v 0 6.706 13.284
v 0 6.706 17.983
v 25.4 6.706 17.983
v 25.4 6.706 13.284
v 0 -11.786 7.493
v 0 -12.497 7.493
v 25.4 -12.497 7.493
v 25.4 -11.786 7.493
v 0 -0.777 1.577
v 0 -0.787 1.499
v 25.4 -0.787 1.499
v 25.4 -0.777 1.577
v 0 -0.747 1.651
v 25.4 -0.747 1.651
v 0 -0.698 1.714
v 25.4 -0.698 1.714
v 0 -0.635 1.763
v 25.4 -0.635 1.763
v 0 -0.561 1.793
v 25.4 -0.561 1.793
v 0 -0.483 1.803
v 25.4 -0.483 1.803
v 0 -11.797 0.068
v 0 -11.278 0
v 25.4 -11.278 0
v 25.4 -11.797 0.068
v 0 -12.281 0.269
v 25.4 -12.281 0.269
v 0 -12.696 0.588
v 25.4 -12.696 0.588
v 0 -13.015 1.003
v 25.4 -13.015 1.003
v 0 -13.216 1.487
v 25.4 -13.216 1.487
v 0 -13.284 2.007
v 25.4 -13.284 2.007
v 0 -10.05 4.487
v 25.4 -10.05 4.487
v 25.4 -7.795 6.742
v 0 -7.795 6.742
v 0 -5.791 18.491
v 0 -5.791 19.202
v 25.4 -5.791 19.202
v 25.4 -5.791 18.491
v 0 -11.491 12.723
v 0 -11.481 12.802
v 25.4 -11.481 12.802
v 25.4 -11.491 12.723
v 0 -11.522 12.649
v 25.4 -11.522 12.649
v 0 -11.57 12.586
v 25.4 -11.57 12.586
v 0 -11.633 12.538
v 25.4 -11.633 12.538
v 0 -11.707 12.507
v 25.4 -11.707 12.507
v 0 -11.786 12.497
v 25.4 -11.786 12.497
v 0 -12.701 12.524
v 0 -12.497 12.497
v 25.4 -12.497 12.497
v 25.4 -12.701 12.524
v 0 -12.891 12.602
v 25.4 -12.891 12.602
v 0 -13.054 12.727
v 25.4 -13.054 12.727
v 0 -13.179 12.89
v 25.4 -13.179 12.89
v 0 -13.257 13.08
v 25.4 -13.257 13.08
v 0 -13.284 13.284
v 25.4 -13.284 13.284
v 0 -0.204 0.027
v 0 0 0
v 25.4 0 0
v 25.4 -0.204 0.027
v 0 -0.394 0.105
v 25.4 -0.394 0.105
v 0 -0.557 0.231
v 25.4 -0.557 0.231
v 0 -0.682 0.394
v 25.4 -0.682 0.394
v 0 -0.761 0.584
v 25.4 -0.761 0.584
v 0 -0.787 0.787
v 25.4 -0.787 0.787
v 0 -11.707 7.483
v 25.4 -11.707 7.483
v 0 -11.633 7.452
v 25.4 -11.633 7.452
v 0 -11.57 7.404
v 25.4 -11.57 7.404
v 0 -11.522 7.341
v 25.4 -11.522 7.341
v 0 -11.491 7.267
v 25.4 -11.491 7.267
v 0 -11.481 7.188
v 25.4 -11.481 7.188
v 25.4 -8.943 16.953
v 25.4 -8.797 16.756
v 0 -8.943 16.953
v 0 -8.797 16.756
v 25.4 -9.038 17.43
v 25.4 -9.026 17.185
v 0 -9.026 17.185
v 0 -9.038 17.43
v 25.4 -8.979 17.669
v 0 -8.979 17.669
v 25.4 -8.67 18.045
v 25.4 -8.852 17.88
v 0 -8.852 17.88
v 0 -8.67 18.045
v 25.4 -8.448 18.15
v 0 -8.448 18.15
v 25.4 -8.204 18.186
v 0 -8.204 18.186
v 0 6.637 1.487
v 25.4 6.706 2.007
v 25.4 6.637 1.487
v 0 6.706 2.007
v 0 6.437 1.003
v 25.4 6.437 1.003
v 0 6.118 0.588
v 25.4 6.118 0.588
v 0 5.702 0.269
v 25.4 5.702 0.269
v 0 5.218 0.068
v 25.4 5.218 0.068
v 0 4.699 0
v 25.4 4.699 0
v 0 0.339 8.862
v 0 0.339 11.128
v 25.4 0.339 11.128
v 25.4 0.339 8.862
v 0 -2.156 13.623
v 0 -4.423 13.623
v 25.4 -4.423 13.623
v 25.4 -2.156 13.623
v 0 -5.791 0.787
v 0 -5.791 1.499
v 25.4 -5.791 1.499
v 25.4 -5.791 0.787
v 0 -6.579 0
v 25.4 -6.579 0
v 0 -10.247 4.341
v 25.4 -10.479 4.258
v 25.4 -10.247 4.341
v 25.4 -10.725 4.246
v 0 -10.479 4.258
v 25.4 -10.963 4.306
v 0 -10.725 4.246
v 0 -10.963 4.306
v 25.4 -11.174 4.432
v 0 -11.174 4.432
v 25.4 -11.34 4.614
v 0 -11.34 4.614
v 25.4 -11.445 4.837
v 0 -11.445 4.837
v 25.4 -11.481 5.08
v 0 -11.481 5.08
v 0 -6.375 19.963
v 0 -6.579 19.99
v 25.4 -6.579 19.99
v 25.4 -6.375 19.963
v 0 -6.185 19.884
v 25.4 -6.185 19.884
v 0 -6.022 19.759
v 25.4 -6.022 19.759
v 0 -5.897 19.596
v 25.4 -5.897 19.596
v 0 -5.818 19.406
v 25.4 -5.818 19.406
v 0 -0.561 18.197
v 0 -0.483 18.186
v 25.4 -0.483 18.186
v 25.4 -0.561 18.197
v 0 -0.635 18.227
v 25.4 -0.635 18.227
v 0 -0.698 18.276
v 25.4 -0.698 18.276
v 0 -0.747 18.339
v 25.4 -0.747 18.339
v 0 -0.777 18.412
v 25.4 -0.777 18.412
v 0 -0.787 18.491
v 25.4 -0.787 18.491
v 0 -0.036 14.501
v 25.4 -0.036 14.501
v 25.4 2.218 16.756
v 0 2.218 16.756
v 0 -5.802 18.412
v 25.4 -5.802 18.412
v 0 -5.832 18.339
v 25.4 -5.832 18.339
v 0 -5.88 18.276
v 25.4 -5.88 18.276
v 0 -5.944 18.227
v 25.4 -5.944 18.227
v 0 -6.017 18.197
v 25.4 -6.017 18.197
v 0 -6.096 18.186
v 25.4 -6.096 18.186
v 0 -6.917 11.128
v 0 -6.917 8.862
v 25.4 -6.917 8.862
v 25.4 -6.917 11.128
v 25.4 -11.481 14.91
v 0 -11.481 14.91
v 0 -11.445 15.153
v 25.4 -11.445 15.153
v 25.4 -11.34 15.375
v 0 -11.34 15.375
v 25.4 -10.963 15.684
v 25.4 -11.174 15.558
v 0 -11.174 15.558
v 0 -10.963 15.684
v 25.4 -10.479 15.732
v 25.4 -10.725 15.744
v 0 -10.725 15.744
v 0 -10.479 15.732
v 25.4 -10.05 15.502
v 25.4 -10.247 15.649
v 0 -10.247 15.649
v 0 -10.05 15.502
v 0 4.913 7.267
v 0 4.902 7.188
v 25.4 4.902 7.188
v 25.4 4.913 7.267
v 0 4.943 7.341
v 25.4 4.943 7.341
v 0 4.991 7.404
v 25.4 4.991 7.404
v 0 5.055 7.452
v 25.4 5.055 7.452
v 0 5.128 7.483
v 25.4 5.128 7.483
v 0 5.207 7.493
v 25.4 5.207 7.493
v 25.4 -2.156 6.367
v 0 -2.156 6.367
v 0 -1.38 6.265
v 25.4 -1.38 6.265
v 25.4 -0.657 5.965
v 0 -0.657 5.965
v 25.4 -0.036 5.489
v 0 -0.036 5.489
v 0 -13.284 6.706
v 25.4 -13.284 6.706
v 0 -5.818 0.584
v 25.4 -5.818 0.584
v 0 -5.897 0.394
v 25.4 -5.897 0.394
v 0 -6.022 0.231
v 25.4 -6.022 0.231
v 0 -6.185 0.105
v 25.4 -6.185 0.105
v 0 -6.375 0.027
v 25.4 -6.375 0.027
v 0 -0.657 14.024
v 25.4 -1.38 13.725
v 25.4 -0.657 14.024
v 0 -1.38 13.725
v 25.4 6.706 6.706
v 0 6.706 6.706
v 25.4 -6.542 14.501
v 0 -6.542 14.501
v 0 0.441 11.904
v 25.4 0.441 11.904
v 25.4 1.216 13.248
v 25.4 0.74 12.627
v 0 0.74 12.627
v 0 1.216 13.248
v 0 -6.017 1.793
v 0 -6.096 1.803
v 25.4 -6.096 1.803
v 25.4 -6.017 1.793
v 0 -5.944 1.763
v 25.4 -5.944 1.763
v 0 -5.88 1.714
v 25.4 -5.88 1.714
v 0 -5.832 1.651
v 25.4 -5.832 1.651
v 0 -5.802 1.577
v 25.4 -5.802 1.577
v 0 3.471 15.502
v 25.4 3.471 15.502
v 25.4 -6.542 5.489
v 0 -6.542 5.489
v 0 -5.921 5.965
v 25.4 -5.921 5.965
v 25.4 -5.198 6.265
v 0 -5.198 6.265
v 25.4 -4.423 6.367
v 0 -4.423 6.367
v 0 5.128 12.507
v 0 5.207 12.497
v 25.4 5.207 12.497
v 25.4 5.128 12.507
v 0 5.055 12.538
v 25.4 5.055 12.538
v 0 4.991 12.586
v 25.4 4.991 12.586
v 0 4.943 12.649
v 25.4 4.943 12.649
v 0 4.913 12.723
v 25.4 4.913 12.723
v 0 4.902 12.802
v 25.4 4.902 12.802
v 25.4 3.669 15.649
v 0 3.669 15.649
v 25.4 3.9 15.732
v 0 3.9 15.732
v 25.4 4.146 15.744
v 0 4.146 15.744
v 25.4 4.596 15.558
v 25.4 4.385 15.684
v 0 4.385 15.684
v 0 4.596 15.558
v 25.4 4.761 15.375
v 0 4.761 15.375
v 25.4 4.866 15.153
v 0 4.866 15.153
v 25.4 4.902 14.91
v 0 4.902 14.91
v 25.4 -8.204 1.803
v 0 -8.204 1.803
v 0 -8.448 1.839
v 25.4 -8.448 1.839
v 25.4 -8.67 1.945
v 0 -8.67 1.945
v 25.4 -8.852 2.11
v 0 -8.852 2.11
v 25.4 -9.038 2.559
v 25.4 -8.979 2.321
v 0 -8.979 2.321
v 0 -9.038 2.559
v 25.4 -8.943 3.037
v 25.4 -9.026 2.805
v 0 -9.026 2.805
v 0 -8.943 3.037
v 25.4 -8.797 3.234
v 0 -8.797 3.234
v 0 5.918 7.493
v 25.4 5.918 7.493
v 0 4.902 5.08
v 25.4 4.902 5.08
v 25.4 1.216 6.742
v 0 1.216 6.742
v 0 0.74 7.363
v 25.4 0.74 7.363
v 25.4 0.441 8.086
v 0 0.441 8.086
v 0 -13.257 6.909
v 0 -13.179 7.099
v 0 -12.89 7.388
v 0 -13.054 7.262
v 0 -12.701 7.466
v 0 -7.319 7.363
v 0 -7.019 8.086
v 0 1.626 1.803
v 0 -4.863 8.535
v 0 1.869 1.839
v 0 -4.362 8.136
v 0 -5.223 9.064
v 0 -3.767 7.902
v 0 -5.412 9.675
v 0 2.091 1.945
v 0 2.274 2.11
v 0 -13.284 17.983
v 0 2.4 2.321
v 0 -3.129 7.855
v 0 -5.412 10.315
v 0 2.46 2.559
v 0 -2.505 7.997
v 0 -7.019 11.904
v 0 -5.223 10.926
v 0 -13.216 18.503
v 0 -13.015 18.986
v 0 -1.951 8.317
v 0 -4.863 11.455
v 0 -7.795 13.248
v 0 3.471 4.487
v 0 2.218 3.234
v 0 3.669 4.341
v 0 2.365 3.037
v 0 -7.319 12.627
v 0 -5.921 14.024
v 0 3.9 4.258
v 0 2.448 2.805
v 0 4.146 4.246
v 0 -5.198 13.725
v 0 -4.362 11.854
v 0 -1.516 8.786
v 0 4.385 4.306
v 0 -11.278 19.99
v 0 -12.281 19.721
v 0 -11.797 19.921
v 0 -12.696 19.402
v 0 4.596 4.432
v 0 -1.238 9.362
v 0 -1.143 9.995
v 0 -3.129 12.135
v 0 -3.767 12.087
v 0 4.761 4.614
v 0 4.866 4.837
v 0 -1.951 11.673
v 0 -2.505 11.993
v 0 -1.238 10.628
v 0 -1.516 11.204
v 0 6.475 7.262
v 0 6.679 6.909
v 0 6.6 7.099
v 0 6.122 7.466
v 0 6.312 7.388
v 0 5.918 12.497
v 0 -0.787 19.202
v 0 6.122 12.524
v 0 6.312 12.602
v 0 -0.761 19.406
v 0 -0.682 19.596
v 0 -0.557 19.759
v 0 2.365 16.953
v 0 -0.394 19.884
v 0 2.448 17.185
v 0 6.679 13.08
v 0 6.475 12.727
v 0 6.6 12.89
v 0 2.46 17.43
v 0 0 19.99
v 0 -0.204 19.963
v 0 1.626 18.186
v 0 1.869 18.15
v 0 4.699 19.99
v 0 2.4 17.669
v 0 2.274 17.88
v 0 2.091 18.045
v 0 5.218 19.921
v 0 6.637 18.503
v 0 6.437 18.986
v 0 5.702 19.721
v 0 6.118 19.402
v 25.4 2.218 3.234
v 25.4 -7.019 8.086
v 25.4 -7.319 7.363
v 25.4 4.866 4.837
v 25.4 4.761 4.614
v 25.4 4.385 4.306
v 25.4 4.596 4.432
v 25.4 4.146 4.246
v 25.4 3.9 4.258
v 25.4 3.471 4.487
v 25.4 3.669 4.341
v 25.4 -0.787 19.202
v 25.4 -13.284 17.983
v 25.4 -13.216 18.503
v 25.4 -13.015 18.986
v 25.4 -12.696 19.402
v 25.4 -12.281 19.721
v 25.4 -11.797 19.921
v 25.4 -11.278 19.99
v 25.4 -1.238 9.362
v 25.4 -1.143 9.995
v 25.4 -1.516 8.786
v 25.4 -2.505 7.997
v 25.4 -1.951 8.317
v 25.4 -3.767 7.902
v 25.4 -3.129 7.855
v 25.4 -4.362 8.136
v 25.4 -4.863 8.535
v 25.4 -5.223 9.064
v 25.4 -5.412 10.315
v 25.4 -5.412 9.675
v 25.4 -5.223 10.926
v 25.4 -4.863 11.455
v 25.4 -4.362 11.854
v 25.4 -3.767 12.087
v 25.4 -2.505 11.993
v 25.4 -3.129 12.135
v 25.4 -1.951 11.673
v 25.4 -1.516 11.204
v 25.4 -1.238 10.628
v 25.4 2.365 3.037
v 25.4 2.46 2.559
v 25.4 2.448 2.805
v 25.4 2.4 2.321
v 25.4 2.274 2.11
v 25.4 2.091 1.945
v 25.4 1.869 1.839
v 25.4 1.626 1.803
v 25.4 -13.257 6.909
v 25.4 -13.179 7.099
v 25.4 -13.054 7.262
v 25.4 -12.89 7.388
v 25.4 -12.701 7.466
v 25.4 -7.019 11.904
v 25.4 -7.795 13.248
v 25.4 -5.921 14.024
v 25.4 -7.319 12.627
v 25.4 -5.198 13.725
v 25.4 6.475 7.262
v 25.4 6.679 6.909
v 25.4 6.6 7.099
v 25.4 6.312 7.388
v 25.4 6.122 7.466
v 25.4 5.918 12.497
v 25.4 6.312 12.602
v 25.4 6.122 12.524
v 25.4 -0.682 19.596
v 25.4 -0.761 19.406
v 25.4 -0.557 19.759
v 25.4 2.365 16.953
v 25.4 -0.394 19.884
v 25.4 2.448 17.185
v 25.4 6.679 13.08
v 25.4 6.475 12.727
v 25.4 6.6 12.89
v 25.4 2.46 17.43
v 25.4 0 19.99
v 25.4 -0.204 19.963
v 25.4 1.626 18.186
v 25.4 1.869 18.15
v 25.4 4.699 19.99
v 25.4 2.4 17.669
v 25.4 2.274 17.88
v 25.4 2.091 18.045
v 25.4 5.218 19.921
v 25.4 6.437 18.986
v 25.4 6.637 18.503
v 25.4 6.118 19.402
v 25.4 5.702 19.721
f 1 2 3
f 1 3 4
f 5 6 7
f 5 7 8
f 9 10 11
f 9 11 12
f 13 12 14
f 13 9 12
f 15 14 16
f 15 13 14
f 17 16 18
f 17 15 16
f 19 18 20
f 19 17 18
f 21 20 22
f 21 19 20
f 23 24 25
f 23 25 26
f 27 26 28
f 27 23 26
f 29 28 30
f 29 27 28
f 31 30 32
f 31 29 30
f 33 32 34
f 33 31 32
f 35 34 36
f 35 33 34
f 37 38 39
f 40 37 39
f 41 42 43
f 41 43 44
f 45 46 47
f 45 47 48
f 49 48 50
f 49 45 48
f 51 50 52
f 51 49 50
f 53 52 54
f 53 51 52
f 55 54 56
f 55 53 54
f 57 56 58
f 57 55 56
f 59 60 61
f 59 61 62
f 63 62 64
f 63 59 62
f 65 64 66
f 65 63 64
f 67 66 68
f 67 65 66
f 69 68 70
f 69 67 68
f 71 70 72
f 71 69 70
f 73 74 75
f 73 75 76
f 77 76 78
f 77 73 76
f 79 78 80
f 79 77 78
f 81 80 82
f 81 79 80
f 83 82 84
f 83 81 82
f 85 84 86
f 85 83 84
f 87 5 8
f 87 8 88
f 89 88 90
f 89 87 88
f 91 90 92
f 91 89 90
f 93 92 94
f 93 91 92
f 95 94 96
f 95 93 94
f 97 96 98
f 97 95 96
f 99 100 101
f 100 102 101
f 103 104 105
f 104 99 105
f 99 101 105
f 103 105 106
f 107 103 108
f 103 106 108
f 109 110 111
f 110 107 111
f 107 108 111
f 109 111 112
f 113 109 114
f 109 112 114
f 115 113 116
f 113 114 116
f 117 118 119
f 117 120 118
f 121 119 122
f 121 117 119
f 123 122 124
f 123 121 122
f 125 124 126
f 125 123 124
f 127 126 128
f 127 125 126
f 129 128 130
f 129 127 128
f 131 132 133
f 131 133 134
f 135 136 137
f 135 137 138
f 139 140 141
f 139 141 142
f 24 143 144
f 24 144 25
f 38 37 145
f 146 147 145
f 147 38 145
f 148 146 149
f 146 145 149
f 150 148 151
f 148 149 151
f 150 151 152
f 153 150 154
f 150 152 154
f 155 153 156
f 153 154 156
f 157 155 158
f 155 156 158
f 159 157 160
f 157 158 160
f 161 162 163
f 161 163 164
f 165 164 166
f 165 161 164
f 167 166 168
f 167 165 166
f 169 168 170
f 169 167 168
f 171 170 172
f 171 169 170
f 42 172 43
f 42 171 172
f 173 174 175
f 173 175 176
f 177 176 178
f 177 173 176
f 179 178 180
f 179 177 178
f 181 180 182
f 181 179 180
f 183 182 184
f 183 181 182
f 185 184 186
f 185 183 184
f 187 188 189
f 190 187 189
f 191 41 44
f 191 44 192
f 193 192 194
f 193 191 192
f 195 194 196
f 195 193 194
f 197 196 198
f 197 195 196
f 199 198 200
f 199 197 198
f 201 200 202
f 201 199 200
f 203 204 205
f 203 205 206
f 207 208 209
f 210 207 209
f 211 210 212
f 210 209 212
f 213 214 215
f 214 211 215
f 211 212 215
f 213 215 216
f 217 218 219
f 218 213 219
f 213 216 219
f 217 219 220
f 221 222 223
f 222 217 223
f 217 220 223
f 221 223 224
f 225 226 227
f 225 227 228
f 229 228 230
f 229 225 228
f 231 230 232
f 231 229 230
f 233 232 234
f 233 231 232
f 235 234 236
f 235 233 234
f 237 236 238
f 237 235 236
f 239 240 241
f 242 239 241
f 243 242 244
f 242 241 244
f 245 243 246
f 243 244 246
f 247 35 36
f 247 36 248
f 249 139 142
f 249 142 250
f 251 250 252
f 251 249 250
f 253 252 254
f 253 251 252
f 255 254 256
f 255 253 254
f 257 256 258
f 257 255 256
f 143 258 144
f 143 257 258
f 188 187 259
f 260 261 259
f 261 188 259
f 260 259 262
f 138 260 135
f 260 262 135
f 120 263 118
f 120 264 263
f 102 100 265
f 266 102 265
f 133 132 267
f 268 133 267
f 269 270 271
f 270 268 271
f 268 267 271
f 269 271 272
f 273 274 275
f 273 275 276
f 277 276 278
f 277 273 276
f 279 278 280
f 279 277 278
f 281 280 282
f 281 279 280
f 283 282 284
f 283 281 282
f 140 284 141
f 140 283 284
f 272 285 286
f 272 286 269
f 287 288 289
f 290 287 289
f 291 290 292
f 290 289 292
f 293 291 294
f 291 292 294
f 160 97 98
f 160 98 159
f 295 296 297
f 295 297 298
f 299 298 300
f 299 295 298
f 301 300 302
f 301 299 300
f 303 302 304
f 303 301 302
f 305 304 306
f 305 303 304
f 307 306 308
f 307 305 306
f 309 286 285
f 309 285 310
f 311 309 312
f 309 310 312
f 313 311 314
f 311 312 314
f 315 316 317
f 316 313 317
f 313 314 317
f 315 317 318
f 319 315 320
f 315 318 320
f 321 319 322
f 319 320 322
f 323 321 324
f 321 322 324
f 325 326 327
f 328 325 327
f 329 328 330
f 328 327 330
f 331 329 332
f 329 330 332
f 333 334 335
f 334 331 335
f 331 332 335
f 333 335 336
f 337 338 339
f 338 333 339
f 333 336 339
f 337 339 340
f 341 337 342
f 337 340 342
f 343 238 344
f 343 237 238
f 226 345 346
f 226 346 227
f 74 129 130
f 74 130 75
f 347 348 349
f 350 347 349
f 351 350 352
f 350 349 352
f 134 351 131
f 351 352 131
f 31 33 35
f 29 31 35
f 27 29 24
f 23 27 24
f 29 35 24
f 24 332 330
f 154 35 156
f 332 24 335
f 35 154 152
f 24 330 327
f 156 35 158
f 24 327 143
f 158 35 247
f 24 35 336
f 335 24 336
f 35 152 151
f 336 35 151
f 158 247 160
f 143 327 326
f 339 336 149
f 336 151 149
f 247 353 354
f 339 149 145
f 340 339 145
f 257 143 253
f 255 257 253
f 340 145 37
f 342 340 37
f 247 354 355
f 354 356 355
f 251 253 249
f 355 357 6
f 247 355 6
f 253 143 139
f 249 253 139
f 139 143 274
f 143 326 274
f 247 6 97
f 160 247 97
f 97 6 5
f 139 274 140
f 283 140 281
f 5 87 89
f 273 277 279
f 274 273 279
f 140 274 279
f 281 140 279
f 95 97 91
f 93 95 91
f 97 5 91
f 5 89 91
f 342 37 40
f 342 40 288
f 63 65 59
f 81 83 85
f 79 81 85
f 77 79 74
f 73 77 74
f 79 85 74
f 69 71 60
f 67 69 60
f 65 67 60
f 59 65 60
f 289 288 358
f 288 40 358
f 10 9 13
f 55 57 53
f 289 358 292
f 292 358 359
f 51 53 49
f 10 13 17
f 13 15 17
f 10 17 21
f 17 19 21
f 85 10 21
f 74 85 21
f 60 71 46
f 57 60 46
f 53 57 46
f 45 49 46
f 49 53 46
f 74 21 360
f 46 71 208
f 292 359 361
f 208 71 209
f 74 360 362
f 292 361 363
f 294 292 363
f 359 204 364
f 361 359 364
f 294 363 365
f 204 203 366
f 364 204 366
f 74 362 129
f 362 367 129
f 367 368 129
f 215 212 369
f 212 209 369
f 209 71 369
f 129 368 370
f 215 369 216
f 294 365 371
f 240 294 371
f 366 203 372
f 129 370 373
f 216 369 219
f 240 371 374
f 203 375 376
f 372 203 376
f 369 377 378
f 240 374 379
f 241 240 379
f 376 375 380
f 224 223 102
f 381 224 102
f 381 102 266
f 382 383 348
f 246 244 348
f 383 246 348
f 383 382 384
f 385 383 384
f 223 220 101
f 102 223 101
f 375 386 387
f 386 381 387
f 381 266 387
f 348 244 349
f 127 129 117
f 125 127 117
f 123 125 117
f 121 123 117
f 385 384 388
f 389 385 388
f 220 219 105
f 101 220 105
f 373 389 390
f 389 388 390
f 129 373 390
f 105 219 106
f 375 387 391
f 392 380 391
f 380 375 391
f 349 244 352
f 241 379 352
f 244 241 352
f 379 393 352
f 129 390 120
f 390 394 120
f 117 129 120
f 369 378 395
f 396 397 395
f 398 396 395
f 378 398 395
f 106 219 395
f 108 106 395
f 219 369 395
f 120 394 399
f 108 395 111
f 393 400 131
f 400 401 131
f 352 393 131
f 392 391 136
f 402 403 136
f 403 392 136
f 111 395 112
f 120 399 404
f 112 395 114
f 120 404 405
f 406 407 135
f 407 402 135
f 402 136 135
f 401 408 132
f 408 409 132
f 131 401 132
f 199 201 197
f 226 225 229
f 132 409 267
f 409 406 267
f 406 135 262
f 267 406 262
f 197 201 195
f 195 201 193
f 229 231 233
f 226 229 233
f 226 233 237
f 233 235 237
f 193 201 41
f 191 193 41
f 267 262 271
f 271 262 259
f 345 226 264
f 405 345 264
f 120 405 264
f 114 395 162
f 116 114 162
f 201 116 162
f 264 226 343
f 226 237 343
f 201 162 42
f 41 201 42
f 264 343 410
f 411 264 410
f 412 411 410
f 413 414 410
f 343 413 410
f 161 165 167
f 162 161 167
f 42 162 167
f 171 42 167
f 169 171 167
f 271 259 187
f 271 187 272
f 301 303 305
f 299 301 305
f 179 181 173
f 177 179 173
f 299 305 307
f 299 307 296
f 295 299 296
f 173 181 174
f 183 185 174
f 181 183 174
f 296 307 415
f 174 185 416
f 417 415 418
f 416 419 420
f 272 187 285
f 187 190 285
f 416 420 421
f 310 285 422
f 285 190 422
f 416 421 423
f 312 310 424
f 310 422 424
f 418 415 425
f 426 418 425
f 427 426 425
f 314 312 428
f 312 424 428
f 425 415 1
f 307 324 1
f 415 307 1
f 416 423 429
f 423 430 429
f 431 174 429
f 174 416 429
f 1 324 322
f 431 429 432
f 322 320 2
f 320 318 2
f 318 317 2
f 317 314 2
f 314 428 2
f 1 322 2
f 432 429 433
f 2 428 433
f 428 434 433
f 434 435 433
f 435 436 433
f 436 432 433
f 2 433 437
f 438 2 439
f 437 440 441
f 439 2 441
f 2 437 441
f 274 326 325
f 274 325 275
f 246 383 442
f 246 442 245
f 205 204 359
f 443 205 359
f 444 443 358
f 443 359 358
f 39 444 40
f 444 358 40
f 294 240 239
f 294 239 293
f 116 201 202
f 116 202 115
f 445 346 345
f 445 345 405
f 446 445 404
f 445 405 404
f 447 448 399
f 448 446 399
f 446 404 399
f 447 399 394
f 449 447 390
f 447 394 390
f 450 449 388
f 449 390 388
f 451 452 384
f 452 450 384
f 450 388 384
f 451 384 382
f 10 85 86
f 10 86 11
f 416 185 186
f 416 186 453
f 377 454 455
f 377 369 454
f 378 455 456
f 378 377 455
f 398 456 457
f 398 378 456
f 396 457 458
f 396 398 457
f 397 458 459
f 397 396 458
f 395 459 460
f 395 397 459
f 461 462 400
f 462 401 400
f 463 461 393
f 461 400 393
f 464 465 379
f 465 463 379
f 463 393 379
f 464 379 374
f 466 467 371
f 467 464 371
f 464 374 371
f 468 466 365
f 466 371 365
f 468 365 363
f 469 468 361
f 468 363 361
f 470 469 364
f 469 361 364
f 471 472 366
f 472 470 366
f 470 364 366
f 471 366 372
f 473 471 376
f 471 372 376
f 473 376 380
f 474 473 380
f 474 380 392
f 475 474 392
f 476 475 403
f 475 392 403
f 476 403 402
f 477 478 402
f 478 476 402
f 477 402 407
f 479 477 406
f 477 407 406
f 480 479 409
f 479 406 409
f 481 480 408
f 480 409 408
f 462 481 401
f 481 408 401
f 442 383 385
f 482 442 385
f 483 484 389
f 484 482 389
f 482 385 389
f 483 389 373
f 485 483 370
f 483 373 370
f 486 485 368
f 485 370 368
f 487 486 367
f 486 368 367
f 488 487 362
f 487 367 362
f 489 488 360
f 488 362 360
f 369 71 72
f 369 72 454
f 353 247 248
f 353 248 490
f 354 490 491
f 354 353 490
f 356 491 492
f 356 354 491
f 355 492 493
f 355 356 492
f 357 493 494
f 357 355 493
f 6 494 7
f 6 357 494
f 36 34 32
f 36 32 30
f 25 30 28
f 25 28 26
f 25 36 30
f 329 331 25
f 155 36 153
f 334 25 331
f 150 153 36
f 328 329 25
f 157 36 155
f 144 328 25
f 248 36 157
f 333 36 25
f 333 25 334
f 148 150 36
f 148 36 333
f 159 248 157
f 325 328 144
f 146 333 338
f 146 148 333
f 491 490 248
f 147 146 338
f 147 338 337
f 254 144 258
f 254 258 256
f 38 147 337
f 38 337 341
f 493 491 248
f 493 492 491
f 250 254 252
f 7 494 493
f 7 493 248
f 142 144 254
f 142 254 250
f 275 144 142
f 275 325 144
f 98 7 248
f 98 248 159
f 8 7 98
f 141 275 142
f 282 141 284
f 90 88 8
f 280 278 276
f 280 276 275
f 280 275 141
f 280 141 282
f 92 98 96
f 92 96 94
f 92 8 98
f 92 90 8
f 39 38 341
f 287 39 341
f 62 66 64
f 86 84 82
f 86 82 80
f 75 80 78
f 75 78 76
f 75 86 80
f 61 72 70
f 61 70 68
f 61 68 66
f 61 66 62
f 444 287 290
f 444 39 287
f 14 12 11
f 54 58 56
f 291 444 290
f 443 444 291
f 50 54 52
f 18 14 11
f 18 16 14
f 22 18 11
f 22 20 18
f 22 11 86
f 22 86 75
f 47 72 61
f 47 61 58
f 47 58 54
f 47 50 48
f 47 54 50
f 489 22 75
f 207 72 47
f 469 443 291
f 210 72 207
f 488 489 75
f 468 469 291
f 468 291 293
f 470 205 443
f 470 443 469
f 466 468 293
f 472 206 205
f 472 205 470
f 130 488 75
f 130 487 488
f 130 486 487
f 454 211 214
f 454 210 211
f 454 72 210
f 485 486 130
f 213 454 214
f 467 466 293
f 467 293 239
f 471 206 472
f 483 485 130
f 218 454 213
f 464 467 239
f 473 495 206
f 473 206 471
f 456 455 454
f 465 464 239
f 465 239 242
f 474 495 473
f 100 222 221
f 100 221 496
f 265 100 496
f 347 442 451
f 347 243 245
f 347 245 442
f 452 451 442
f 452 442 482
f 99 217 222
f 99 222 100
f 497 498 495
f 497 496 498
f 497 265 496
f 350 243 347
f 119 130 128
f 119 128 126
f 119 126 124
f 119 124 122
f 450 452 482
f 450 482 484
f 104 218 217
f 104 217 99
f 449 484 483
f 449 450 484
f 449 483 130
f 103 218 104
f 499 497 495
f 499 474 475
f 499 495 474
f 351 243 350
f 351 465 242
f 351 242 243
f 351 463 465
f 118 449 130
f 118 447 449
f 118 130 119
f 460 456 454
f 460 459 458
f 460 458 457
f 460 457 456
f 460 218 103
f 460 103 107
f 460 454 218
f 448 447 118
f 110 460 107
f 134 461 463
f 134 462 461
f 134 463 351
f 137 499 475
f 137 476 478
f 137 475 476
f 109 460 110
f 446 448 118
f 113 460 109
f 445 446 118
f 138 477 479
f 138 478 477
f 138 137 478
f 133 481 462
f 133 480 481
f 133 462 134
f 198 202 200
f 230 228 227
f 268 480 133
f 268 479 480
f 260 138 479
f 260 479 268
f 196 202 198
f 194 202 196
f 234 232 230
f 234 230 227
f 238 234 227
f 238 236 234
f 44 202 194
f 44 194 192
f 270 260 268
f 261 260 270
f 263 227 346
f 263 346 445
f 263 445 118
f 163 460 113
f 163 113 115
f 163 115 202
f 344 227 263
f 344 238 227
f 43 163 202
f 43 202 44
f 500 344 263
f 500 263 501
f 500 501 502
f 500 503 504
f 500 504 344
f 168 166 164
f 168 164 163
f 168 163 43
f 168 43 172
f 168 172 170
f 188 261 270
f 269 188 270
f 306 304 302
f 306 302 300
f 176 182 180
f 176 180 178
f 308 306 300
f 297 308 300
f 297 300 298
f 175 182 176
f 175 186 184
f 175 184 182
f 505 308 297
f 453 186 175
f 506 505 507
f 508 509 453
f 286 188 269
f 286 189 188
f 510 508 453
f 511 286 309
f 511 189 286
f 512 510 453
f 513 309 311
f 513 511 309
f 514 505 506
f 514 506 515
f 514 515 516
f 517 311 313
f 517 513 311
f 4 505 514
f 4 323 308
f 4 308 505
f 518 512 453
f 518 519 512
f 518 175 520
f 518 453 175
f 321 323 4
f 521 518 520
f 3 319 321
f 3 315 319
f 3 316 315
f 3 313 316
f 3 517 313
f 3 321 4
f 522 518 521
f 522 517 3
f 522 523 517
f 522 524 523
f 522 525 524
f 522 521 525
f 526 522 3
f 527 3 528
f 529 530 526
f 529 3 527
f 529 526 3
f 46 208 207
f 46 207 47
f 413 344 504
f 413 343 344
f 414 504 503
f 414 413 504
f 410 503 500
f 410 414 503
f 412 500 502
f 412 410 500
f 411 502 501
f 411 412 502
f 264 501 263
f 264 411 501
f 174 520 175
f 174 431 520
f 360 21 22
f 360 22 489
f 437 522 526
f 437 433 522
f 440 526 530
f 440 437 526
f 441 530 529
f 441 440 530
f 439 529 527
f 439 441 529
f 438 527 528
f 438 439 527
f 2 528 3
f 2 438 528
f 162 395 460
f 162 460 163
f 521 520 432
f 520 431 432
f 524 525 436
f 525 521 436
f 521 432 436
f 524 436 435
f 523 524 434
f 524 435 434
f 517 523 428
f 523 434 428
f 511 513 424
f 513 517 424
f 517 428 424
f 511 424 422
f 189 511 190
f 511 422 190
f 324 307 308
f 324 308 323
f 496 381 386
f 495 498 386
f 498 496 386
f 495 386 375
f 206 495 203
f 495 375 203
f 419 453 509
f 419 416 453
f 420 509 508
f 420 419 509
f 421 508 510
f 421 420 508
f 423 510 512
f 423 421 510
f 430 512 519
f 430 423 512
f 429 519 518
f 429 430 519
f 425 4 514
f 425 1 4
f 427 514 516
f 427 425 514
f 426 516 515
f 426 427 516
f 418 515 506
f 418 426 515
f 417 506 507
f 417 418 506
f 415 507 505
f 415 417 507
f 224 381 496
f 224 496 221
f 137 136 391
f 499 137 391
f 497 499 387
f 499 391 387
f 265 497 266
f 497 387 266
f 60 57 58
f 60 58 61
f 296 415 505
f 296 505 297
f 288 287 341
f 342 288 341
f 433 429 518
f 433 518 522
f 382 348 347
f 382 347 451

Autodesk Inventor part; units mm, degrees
ref_plane "YZ Plane" through (0, 0, 0) normal (1, 0, 0) x (0, 1, 0)
ref_plane "XZ Plane" through (0, 0, 0) normal (0, 1, 0) x (-1, 0, 0)
ref_plane "XY Plane" through (0, 0, 0) normal (0, 0, 1) x (1, 0, 0)
sketch "Sketch1" plane through (0, 0, 0) normal (1, 0, 0) x (0, 1, 0)
  circle A0 centre (-3.2893, 9.9949) radius 2.1463
  line L0 (2.2183, 3.2343) -> (-0.0365, 5.4891)
  arc A1 (1.6256, 1.8034) -> (2.2183, 3.2343) centre (1.6256, 2.6416) ccw
  line L1 (-0.4826, 1.8034) -> (1.6256, 1.8034)
  arc A2 (-0.4826, 1.8034) -> (-0.7874, 1.4986) centre (-0.4826, 1.4986) ccw
  line L2 (-0.7874, 0.7874) -> (-0.7874, 1.4986)
  arc A3 (-0.7874, 0.7874) -> (0, 0) centre (0, 0.7874) ccw
  line L3 (4.699, 0) -> (0, 0)
  arc A4 (4.699, 0) -> (6.7056, 2.0066) centre (4.699, 2.0066) ccw
  line L4 (6.7056, 6.7056) -> (6.7056, 2.0066)
  arc A5 (6.7056, 6.7056) -> (5.9182, 7.493) centre (5.9182, 6.7056) ccw
  line L5 (5.207, 7.493) -> (5.9182, 7.493)
  arc A6 (5.207, 7.493) -> (4.9022, 7.1882) centre (5.207, 7.1882) ccw
  line L6 (4.9022, 5.08) -> (4.9022, 7.1882)
  arc A7 (3.4713, 4.4873) -> (4.9022, 5.08) centre (4.064, 5.08) ccw
  line L7 (1.2165, 6.7421) -> (3.4713, 4.4873)
  arc A8 (0.3386, 8.8615) -> (1.2165, 6.7421) centre (3.3358, 8.8615) ccw
  line L8 (0.3386, 11.1283) -> (0.3386, 8.8615)
  arc A9 (1.2165, 13.2477) -> (0.3386, 11.1283) centre (3.3358, 11.1283) ccw
  line L9 (3.4713, 15.5025) -> (1.2165, 13.2477)
  arc A10 (4.9022, 14.9098) -> (3.4713, 15.5025) centre (4.064, 14.9098) ccw
  line L10 (4.9022, 12.8016) -> (4.9022, 14.9098)
  arc A11 (4.9022, 12.8016) -> (5.207, 12.4968) centre (5.207, 12.8016) ccw
  line L11 (5.9182, 12.4968) -> (5.207, 12.4968)
  arc A12 (5.9182, 12.4968) -> (6.7056, 13.2842) centre (5.9182, 13.2842) ccw
  line L12 (6.7056, 17.9832) -> (6.7056, 13.2842)
  arc A13 (6.7056, 17.9832) -> (4.699, 19.9898) centre (4.699, 17.9832) ccw
  line L13 (0, 19.9898) -> (4.699, 19.9898)
  arc A14 (0, 19.9898) -> (-0.7874, 19.2024) centre (0, 19.2024) ccw
  line L14 (-0.7874, 18.4912) -> (-0.7874, 19.2024)
  arc A15 (-0.7874, 18.4912) -> (-0.4826, 18.1864) centre (-0.4826, 18.4912) ccw
  line L15 (1.6256, 18.1864) -> (-0.4826, 18.1864)
  arc A16 (2.2183, 16.7555) -> (1.6256, 18.1864) centre (1.6256, 17.3482) ccw
  line L16 (-0.0365, 14.5007) -> (2.2183, 16.7555)
  arc A17 (-2.1559, 13.6228) -> (-0.0365, 14.5007) centre (-2.1559, 16.62) ccw
  line L17 (-4.4227, 13.6228) -> (-2.1559, 13.6228)
  arc A18 (-6.5421, 14.5007) -> (-4.4227, 13.6228) centre (-4.4227, 16.62) ccw
  line L18 (-8.7969, 16.7555) -> (-6.5421, 14.5007)
  arc A19 (-8.2042, 18.1864) -> (-8.7969, 16.7555) centre (-8.2042, 17.3482) ccw
  line L19 (-6.096, 18.1864) -> (-8.2042, 18.1864)
  arc A20 (-6.096, 18.1864) -> (-5.7912, 18.4912) centre (-6.096, 18.4912) ccw
  line L20 (-5.7912, 19.2024) -> (-5.7912, 18.4912)
  arc A21 (-5.7912, 19.2024) -> (-6.5786, 19.9898) centre (-6.5786, 19.2024) ccw
  line L21 (-11.2776, 19.9898) -> (-6.5786, 19.9898)
  arc A22 (-11.2776, 19.9898) -> (-13.2842, 17.9832) centre (-11.2776, 17.9832) ccw
  line L22 (-13.2842, 13.2842) -> (-13.2842, 17.9832)
  arc A23 (-13.2842, 13.2842) -> (-12.4968, 12.4968) centre (-12.4968, 13.2842) ccw
  line L23 (-11.7856, 12.4968) -> (-12.4968, 12.4968)
  arc A24 (-11.7856, 12.4968) -> (-11.4808, 12.8016) centre (-11.7856, 12.8016) ccw
  line L24 (-11.4808, 14.9098) -> (-11.4808, 12.8016)
  arc A25 (-10.0499, 15.5025) -> (-11.4808, 14.9098) centre (-10.6426, 14.9098) ccw
  line L25 (-7.7951, 13.2477) -> (-10.0499, 15.5025)
  arc A26 (-6.9172, 11.1283) -> (-7.7951, 13.2477) centre (-9.9144, 11.1283) ccw
  line L26 (-6.9172, 8.8615) -> (-6.9172, 11.1283)
  arc A27 (-7.7951, 6.7421) -> (-6.9172, 8.8615) centre (-9.9144, 8.8615) ccw
  line L27 (-10.0499, 4.4873) -> (-7.7951, 6.7421)
  arc A28 (-11.4808, 5.08) -> (-10.0499, 4.4873) centre (-10.6426, 5.08) ccw
  line L28 (-11.4808, 7.1882) -> (-11.4808, 5.08)
  arc A29 (-11.4808, 7.1882) -> (-11.7856, 7.493) centre (-11.7856, 7.1882) ccw
  line L29 (-12.4968, 7.493) -> (-11.7856, 7.493)
  arc A30 (-12.4968, 7.493) -> (-13.2842, 6.7056) centre (-12.4968, 6.7056) ccw
  line L30 (-13.2842, 2.0066) -> (-13.2842, 6.7056)
  arc A31 (-13.2842, 2.0066) -> (-11.2776, 0) centre (-11.2776, 2.0066) ccw
  line L31 (-6.5786, 0) -> (-11.2776, 0)
  arc A32 (-6.5786, 0) -> (-5.7912, 0.7874) centre (-6.5786, 0.7874) ccw
  line L32 (-5.7912, 1.4986) -> (-5.7912, 0.7874)
  arc A33 (-5.7912, 1.4986) -> (-6.096, 1.8034) centre (-6.096, 1.4986) ccw
  line L33 (-8.2042, 1.8034) -> (-6.096, 1.8034)
  arc A34 (-8.7969, 3.2343) -> (-8.2042, 1.8034) centre (-8.2042, 2.6416) ccw
  line L34 (-6.5421, 5.4891) -> (-8.7969, 3.2343)
  arc A35 (-4.4227, 6.367) -> (-6.5421, 5.4891) centre (-4.4227, 3.3698) ccw
  line L35 (-2.1559, 6.367) -> (-4.4227, 6.367)
  arc A36 (-0.0365, 5.4891) -> (-2.1559, 6.367) centre (-2.1559, 3.3698) ccw
extrude "Extrusion1" add sketch "Sketch1" along normal blind 25.4
properties part number "Extruson profile"
